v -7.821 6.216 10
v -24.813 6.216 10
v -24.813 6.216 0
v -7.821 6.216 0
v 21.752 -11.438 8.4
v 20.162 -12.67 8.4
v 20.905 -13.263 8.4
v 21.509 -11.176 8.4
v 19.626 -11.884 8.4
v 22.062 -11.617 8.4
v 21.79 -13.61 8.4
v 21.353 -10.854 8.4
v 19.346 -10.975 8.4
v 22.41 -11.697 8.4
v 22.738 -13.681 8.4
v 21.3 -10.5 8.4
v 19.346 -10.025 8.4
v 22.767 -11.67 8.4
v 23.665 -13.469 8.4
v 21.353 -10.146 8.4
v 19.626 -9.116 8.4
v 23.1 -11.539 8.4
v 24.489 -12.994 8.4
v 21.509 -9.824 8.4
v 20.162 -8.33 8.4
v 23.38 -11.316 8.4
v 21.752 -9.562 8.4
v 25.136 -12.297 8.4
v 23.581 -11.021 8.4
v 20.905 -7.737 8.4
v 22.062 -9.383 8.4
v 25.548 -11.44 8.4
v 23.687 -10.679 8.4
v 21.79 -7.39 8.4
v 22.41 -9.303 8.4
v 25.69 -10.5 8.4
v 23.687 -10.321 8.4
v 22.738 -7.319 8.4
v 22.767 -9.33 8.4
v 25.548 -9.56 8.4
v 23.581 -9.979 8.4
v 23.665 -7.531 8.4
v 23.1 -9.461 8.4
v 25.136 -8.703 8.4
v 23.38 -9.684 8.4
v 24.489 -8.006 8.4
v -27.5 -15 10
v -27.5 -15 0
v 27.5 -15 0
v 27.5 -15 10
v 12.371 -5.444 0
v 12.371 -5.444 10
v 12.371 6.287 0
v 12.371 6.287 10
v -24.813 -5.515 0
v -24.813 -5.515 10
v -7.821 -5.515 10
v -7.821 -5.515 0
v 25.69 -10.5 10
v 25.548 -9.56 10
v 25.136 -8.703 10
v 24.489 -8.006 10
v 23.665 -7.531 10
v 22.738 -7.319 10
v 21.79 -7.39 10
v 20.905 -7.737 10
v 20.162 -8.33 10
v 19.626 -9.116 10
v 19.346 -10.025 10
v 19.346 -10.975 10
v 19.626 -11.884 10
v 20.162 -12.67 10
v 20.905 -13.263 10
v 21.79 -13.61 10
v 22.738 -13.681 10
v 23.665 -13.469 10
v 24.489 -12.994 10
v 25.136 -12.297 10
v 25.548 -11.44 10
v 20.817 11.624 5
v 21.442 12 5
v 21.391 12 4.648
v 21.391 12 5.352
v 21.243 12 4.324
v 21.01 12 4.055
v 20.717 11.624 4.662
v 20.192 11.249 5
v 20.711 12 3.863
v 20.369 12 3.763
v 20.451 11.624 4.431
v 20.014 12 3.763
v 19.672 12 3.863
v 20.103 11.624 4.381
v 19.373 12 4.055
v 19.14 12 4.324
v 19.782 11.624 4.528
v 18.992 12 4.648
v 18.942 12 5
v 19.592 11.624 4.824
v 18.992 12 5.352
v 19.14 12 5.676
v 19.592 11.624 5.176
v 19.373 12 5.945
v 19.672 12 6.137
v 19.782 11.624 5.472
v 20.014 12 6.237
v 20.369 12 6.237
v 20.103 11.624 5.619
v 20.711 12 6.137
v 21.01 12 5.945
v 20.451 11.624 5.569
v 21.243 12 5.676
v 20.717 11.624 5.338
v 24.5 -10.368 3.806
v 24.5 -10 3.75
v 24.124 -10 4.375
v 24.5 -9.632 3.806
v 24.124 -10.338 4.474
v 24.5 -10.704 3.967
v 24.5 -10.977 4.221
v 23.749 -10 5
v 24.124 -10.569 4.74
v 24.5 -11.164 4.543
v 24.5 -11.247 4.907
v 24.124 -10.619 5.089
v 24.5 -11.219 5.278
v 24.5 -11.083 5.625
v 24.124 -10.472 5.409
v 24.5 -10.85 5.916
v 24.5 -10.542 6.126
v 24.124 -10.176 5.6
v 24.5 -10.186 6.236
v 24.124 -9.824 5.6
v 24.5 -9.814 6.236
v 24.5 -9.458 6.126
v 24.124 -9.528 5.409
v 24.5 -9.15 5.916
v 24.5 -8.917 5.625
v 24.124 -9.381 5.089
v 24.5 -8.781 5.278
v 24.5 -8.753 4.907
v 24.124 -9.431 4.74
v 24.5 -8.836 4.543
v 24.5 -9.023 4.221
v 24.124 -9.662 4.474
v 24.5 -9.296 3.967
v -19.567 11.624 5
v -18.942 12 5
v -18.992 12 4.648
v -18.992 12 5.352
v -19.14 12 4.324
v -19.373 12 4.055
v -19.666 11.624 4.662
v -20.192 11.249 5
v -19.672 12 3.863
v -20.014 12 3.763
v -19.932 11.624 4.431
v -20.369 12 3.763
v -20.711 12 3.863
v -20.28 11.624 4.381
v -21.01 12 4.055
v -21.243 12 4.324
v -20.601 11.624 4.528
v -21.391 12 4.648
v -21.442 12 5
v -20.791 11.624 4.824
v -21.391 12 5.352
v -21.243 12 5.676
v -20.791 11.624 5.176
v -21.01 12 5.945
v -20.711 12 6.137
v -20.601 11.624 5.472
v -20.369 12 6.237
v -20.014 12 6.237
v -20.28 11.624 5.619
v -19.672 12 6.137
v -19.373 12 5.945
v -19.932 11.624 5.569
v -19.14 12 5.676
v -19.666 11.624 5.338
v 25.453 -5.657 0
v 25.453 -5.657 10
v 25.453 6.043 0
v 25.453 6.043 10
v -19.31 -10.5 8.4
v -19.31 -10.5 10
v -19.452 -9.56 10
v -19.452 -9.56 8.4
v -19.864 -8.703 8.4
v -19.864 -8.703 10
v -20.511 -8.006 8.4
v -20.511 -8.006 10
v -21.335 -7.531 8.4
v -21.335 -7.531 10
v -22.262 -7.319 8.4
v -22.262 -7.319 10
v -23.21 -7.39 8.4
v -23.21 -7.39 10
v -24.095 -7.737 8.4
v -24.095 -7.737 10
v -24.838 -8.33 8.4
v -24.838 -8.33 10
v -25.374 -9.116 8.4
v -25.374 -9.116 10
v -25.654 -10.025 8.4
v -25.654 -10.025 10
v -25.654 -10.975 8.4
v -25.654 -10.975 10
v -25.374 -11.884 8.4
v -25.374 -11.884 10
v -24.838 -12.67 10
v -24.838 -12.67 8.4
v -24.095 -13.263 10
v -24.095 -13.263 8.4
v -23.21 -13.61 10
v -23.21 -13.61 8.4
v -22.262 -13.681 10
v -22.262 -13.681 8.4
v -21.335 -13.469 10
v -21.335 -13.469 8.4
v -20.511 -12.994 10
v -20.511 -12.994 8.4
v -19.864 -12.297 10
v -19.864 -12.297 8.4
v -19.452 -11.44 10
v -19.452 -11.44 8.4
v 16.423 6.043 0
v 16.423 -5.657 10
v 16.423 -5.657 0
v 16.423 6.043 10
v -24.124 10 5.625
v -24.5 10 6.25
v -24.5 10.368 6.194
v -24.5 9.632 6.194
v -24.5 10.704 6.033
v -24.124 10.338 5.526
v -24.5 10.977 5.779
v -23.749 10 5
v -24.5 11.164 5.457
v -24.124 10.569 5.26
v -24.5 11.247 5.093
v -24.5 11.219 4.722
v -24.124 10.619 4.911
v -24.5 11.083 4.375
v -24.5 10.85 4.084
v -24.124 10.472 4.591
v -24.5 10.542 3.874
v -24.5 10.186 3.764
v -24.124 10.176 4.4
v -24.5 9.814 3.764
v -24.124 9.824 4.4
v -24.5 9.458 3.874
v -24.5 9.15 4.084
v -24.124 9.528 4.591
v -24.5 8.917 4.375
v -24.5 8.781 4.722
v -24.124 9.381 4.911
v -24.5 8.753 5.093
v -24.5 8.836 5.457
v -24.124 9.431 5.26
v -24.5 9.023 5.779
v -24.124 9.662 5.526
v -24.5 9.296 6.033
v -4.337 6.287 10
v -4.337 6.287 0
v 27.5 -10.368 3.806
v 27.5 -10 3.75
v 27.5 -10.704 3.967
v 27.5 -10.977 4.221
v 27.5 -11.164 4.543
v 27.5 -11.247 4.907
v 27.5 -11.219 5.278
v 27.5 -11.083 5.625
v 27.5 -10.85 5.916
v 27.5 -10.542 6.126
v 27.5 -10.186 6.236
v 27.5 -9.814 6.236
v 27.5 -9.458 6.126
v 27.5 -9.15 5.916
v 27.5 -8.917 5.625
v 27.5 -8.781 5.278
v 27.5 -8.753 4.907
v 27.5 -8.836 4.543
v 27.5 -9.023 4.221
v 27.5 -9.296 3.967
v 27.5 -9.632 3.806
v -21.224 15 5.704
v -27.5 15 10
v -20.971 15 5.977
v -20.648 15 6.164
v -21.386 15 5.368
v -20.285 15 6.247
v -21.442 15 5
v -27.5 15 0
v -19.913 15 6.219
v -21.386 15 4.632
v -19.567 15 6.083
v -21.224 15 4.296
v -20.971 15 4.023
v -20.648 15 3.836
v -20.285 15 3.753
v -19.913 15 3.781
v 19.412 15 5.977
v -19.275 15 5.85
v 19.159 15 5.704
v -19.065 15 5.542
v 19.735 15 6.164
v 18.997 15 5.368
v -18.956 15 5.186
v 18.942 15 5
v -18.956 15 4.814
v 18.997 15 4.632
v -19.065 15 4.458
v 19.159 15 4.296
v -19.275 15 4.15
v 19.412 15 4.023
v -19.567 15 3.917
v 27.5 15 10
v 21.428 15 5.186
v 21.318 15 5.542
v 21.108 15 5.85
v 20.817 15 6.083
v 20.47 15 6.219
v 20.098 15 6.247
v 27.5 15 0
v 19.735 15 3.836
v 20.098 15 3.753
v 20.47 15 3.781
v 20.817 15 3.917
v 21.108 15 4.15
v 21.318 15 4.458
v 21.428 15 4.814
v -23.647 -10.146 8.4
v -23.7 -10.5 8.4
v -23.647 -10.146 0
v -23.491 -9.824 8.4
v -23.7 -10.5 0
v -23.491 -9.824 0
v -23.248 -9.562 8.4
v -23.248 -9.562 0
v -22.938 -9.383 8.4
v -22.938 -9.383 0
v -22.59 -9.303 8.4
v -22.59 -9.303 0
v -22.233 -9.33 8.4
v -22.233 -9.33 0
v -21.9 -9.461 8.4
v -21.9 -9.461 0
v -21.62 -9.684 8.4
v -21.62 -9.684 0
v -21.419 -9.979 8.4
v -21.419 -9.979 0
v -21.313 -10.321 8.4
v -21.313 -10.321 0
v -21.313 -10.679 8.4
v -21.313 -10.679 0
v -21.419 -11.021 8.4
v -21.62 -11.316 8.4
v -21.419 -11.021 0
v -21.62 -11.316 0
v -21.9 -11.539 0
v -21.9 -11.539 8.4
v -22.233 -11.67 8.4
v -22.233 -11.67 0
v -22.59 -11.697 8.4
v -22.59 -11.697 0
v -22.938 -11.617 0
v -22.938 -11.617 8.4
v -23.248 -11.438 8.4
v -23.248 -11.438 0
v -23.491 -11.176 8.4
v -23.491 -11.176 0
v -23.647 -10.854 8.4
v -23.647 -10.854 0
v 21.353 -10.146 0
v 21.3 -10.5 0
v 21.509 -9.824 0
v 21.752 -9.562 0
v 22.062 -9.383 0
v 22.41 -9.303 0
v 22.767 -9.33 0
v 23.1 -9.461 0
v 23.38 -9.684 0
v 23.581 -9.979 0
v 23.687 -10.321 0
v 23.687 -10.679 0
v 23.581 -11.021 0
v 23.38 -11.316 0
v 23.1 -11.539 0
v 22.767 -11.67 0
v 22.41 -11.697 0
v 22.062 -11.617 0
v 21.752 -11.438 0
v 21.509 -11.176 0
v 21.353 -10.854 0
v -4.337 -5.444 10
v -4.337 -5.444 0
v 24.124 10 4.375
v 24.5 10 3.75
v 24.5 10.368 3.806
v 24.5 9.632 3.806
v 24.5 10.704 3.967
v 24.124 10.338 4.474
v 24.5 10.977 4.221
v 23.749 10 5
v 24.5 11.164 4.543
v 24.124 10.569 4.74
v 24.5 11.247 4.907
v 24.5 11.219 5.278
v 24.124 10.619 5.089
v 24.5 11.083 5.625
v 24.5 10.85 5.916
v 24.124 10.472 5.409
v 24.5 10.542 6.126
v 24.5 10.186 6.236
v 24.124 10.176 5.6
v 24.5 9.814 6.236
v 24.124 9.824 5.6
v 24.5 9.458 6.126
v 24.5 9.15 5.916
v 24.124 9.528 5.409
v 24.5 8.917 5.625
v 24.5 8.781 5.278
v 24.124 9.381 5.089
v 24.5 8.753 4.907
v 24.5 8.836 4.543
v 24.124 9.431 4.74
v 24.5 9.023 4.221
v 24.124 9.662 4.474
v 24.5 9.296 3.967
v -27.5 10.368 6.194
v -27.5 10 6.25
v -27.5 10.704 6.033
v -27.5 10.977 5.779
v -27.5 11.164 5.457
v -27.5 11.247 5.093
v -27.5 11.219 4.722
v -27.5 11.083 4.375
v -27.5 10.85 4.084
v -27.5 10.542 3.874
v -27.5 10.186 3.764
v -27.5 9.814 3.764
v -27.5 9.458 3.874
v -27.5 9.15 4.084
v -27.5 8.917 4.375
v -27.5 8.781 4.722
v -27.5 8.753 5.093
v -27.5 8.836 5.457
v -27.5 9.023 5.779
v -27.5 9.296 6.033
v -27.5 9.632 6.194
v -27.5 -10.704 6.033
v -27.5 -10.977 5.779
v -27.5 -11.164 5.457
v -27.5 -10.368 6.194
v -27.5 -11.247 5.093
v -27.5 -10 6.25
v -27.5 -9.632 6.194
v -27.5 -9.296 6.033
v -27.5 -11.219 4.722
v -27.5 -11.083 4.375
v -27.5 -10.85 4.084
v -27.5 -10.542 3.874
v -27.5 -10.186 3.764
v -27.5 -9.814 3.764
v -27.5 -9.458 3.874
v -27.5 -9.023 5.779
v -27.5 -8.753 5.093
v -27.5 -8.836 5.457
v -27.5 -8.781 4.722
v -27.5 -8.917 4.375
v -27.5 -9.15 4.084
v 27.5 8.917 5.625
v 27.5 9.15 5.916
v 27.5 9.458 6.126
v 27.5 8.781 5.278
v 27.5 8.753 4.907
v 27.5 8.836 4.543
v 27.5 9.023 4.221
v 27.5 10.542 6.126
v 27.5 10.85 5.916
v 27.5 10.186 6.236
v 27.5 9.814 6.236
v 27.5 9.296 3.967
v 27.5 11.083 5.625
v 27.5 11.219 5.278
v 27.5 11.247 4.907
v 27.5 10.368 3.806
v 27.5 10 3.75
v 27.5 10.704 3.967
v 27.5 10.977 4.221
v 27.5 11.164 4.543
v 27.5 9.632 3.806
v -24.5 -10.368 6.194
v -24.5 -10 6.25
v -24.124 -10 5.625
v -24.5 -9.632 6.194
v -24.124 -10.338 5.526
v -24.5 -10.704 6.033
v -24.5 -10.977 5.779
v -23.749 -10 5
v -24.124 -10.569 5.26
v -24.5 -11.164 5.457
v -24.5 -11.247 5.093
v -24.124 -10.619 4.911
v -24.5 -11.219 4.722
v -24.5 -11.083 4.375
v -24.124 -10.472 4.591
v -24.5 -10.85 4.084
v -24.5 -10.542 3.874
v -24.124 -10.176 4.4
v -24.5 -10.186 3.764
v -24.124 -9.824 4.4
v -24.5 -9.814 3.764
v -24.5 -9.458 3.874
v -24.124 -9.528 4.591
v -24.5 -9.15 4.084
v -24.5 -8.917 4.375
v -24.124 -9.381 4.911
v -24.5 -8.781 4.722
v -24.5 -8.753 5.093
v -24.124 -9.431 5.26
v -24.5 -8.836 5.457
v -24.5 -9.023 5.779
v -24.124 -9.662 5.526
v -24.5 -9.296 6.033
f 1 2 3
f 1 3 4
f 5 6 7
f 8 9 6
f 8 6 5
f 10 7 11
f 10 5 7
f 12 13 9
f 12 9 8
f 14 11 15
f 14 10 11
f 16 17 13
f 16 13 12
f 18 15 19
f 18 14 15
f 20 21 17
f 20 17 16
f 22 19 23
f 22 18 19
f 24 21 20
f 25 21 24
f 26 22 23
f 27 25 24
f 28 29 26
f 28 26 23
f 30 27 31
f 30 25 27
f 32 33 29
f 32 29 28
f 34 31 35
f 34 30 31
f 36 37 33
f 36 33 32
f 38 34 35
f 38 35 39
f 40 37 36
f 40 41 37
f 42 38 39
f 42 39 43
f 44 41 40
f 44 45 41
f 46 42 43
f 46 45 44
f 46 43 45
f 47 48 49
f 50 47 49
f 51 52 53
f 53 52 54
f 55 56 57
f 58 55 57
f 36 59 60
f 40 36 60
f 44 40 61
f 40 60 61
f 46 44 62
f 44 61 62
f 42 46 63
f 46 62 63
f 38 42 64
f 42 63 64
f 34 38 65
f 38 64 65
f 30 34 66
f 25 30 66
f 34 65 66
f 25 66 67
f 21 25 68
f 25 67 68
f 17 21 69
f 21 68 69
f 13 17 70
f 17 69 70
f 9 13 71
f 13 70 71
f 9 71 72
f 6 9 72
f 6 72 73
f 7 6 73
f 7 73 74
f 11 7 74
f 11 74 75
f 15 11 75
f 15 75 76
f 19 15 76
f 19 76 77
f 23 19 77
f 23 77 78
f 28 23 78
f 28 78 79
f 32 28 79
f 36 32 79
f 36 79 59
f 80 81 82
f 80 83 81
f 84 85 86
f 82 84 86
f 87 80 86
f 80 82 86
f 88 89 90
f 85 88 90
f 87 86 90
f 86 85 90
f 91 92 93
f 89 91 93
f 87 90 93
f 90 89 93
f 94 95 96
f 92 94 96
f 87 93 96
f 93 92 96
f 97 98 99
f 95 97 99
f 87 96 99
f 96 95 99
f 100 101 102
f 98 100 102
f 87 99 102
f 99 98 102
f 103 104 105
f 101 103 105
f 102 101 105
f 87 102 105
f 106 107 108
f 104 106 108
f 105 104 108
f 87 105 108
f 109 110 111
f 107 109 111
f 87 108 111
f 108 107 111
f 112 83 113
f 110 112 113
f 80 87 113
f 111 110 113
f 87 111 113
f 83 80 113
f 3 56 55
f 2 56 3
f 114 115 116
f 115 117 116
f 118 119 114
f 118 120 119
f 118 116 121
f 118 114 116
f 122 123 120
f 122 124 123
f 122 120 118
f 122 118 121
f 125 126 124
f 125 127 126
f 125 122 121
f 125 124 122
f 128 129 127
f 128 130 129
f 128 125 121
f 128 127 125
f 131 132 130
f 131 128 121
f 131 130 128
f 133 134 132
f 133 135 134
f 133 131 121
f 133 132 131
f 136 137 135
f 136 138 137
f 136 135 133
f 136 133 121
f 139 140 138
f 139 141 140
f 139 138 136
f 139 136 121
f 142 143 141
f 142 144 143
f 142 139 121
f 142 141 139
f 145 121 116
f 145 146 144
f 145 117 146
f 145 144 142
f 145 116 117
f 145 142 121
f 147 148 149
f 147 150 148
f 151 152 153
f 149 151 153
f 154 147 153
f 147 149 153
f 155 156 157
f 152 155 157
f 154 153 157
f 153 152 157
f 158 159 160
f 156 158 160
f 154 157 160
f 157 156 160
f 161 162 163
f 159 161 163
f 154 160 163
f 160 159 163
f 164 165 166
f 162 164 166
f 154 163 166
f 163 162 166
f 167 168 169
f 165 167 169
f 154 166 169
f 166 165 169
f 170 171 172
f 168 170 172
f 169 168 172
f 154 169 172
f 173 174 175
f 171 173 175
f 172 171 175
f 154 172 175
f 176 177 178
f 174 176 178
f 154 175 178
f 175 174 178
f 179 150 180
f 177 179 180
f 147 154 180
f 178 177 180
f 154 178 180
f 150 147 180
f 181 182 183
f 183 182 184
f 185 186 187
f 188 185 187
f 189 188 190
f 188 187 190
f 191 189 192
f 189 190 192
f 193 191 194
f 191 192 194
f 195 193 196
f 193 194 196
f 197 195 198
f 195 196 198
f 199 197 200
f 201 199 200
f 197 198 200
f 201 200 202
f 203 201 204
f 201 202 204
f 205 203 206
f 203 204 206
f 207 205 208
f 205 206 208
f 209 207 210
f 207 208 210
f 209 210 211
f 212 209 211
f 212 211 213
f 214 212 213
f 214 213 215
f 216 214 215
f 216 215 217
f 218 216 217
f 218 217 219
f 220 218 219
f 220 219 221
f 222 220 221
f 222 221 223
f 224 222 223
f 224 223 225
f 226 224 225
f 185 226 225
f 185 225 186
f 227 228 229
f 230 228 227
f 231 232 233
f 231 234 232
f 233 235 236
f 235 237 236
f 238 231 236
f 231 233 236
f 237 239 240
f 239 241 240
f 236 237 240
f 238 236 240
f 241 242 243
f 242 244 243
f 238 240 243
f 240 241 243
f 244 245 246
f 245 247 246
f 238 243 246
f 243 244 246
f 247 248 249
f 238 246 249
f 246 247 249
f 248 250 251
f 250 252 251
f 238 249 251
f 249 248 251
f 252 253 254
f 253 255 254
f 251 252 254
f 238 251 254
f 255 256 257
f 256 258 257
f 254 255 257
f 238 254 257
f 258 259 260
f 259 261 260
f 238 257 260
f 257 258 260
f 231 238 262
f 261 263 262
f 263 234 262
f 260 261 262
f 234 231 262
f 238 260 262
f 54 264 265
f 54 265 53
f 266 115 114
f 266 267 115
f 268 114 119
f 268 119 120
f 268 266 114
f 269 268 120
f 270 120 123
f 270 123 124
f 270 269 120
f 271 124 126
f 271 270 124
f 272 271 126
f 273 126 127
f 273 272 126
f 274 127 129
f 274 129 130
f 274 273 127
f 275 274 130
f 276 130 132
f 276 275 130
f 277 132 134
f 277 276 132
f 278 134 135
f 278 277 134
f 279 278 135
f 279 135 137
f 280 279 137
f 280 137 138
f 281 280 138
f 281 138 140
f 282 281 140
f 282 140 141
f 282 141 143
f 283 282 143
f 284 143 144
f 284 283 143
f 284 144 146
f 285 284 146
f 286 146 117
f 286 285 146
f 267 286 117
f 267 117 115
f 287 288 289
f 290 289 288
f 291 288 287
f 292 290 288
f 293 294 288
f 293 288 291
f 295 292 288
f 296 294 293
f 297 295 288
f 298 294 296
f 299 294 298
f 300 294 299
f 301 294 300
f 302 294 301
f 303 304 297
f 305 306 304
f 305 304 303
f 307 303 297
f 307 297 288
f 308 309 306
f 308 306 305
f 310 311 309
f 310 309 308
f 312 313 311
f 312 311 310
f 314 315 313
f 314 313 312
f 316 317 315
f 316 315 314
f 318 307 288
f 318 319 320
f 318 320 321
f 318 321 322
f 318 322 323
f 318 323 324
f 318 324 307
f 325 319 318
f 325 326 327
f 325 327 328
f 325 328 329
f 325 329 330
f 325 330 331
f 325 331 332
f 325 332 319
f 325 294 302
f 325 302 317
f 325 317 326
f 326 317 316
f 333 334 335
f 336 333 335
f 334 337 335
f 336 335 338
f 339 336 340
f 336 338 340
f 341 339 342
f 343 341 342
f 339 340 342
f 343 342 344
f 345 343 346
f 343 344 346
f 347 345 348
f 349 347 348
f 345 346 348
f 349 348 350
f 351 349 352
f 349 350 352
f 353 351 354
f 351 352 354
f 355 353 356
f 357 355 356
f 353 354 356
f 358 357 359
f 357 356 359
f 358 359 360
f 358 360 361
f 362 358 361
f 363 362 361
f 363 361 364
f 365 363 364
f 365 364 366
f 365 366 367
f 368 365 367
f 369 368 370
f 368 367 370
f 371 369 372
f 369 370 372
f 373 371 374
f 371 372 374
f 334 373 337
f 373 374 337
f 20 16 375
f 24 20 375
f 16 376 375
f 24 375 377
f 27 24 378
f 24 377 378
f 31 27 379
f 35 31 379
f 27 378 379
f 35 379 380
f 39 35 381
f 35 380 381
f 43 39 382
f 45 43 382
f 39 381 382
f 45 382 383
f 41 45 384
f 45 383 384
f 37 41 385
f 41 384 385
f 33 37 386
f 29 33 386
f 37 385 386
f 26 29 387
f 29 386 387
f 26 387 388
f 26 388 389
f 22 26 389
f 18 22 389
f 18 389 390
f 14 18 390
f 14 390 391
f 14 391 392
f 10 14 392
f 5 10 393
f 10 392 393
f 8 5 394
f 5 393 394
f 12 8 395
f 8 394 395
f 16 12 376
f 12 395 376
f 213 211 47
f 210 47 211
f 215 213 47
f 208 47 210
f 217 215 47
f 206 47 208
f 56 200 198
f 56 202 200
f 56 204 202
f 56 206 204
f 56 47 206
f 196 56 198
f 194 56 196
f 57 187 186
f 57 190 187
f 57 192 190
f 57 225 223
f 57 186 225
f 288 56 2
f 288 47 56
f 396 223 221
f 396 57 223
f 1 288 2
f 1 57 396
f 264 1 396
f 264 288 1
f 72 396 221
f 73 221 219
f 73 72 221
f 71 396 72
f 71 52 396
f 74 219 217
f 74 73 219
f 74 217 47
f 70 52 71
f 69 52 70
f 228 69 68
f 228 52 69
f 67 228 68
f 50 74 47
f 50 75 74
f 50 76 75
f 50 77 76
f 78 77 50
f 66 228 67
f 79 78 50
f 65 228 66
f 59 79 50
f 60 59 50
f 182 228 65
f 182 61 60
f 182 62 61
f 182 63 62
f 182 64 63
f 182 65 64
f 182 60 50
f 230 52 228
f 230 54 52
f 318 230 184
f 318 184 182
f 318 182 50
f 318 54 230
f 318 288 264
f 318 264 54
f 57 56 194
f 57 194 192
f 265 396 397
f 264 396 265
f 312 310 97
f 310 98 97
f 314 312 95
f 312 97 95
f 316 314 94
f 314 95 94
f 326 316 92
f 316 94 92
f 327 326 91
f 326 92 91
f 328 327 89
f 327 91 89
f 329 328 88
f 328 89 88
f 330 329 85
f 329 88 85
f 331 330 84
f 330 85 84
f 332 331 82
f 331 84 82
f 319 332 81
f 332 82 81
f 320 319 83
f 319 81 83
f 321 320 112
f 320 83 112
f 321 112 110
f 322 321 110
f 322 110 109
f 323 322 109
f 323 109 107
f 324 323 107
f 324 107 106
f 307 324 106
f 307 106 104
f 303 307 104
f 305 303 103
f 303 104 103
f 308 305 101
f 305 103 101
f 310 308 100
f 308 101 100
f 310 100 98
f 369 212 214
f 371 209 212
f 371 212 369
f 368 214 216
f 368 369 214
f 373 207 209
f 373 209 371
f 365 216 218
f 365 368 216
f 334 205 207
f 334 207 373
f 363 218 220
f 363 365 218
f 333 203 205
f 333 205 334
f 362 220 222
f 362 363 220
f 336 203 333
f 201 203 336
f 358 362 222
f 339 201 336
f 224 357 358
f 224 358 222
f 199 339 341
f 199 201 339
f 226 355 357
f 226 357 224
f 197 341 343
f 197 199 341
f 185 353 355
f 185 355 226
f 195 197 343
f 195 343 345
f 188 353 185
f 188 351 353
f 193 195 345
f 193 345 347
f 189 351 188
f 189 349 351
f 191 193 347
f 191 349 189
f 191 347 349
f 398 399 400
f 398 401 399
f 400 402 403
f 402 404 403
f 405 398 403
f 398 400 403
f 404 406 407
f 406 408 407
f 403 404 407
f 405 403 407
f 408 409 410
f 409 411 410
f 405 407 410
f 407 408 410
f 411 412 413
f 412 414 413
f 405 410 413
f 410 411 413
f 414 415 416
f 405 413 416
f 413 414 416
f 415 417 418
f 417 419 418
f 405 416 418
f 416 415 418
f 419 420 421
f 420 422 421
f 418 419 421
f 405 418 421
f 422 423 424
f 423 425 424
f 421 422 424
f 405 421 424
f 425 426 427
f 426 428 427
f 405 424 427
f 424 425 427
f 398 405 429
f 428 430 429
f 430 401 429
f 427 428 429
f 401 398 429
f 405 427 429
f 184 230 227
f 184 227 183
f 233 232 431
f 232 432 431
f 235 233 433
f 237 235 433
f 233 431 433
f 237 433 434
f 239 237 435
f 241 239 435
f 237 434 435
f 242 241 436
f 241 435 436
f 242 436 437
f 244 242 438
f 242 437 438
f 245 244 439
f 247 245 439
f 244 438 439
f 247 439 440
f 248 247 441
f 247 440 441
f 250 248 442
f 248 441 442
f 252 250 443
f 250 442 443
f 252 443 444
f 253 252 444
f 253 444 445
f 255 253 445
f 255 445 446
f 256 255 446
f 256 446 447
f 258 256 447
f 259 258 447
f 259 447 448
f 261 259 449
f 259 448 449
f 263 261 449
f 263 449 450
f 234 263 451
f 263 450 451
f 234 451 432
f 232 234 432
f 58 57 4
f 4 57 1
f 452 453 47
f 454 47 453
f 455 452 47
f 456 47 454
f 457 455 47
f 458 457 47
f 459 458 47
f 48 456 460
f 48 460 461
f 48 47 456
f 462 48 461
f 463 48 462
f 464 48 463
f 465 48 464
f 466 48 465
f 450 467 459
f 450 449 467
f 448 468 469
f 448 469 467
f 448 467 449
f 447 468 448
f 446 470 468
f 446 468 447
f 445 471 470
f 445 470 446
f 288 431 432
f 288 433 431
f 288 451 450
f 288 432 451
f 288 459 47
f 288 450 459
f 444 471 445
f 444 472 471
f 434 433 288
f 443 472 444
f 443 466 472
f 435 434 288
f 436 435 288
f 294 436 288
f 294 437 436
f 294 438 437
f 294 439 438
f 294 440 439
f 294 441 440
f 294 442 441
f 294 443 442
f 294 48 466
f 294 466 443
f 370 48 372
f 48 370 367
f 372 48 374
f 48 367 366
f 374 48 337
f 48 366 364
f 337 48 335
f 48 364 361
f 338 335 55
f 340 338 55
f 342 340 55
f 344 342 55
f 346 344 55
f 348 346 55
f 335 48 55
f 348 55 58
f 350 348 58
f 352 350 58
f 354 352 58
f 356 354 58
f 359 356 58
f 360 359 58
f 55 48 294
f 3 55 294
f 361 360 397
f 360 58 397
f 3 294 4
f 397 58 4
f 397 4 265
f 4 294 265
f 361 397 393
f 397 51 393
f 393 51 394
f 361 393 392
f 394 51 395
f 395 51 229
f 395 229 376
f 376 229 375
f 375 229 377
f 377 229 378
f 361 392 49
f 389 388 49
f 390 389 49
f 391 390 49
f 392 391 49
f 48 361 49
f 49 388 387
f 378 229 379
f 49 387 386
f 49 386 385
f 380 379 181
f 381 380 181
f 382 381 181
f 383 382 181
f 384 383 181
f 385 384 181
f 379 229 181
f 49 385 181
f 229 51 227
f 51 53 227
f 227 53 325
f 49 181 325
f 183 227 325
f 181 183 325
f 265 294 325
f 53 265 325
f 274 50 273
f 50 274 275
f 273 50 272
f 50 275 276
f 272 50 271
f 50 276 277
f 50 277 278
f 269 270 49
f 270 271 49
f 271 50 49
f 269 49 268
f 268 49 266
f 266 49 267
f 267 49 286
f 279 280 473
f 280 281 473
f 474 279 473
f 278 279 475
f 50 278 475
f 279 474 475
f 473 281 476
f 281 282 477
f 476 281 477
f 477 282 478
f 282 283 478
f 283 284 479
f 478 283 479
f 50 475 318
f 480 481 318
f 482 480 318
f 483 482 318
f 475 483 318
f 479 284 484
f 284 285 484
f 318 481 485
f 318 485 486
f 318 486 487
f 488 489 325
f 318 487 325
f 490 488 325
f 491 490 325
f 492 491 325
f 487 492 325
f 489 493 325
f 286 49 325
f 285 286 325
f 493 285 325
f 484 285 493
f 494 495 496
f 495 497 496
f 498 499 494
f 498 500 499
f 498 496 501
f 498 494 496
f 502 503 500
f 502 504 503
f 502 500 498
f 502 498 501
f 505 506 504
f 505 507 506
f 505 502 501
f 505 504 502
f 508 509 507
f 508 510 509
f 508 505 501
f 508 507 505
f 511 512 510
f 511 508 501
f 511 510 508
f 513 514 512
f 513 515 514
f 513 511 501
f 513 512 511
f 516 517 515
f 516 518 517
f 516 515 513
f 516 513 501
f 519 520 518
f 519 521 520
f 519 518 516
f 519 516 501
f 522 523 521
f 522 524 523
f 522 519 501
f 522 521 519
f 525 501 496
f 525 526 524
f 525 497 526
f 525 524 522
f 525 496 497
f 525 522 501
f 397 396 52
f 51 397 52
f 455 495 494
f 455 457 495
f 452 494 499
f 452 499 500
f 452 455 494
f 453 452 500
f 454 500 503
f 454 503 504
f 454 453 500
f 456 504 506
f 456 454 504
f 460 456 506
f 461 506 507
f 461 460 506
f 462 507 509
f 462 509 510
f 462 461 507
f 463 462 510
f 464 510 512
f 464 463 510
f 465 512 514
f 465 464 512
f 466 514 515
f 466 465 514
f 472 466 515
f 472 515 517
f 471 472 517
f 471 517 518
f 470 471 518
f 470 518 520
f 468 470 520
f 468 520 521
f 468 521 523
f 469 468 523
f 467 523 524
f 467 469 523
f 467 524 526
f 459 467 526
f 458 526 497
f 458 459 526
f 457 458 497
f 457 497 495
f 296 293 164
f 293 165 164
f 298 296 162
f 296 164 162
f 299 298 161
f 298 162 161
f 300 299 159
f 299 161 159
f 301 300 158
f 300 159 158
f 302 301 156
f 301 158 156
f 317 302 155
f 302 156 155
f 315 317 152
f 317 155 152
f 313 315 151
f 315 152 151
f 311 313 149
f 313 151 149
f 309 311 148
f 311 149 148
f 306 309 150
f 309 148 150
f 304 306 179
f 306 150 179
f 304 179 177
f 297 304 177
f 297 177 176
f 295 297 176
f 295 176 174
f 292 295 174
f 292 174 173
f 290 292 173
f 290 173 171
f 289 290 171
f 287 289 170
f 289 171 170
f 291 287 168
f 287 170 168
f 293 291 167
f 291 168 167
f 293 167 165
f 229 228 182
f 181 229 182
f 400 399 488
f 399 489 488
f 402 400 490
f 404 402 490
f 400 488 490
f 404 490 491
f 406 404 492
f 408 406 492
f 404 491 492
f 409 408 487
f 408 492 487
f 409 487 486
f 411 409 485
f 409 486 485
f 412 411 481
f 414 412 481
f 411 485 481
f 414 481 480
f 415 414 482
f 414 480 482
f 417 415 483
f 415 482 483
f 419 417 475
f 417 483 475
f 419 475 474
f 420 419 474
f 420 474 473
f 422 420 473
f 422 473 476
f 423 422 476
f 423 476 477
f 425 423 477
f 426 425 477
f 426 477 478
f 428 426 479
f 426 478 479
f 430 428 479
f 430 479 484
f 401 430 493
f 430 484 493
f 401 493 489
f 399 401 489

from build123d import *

# Parameters (mm, degrees)
SKETCH1_W                                        = 55
SKETCH1_H                                        = 30
BOSS_EXTRUDE1_DEPTH                              = 10
SKETCH3_W                                        = 16.992180867
SKETCH3_H                                        = 11.731003527
SKETCH3_W_2                                      = 16.707792902
SKETCH3_W_3                                      = 9.029317866
SKETCH3_H_2                                      = 11.700356954
CUT_EXTRUDE1_DEPTH                               = 33.882366095
CBORE_FOR_M2_HEX_HEAD_MACHINE_SCREW2_D           = 2.4
CBORE_FOR_M2_HEX_HEAD_MACHINE_SCREW2_CBORE_D     = 6.38
CBORE_FOR_M2_HEX_HEAD_MACHINE_SCREW2_CBORE_DEPTH = 1.6
M3X0_5_TAPPED_HOLE3_D                            = 2.5
M3X0_5_TAPPED_HOLE3_DEPTH                        = 3
M3X0_5_TAPPED_HOLE3_TIP                          = 0.751075774


with BuildPart() as part:
    # Sketch1 → Boss-Extrude1 (new body)
    with BuildSketch(Plane.XY):
        Rectangle(SKETCH1_W, SKETCH1_H)
    extrude(amount=BOSS_EXTRUDE1_DEPTH)

    # Sketch3 → Cut-Extrude1 (cut, through all)
    with BuildSketch(Plane.XY.offset(10)):
        with Locations((-16.316759452, 0.350583033)):
            Rectangle(SKETCH3_W, SKETCH3_H)
        with Locations((4.016979996, 0.421680025)):
            Rectangle(SKETCH3_W_2, SKETCH3_H)
        with Locations((20.938063871, 0.193065764)):
            Rectangle(SKETCH3_W_3, SKETCH3_H_2)
    extrude(amount=-CUT_EXTRUDE1_DEPTH, mode=Mode.SUBTRACT)

    # CBORE for M2 Hex Head Machine Screw2 (through all)
    with Locations(Plane.XY.offset(10)):
        with Locations((-22.5, -10.5), (22.5, -10.5)):
            CounterBoreHole(CBORE_FOR_M2_HEX_HEAD_MACHINE_SCREW2_D / 2, CBORE_FOR_M2_HEX_HEAD_MACHINE_SCREW2_CBORE_D / 2, CBORE_FOR_M2_HEX_HEAD_MACHINE_SCREW2_CBORE_DEPTH)

    # M3x0.5 Tapped Hole3
    with Locations(Plane(origin=(0, 15, 0), x_dir=(1, 0, 0), z_dir=(0, 1, 0))):
        with Locations((-20.191545465, -5), (20.191545465, -5)):
            Hole(M3X0_5_TAPPED_HOLE3_D / 2, depth=M3X0_5_TAPPED_HOLE3_DEPTH)
            with Locations((0, 0, -(M3X0_5_TAPPED_HOLE3_DEPTH + M3X0_5_TAPPED_HOLE3_TIP / 2))):  # 118° drill point
                Cone(0, M3X0_5_TAPPED_HOLE3_D / 2, M3X0_5_TAPPED_HOLE3_TIP, mode=Mode.SUBTRACT)

    # Sketch12 → M3x0.5 Tapped Hole2 (revolve, cut)
    with BuildSketch(Plane(origin=(-27.5, -10, 5), x_dir=(0, 0, 1), z_dir=(0, 1, 0))):
        Polygon((0, 0), (0, 3.751075774), (1.25, 3), (1.25, 0), align=None)
    m3x0_5_tapped_hole2 = revolve(axis=Axis((-33.85, -10, 5), (1, 0, 0)), mode=Mode.SUBTRACT)

    # Sketch16 → M3x0.5 Tapped Hole1 (revolve, cut)
    with BuildSketch(Plane(origin=(27.5, -10, 5), x_dir=(0, 0, -1), z_dir=(0, 1, 0))):
        Polygon((0, 0), (0, 3.751075774), (1.25, 3), (1.25, 0), align=None)
    m3x0_5_tapped_hole1 = revolve(axis=Axis((33.85, -10, 5), (-1, 0, 0)), mode=Mode.SUBTRACT)

    # Mirror1: M3x0.5 Tapped Hole1 across plane
    add(m3x0_5_tapped_hole1.mirror(Plane.ZX), mode=Mode.SUBTRACT)

    # Mirror2: M3x0.5 Tapped Hole2 across plane
    add(m3x0_5_tapped_hole2.mirror(Plane.ZX), mode=Mode.SUBTRACT)


solid = part.part
